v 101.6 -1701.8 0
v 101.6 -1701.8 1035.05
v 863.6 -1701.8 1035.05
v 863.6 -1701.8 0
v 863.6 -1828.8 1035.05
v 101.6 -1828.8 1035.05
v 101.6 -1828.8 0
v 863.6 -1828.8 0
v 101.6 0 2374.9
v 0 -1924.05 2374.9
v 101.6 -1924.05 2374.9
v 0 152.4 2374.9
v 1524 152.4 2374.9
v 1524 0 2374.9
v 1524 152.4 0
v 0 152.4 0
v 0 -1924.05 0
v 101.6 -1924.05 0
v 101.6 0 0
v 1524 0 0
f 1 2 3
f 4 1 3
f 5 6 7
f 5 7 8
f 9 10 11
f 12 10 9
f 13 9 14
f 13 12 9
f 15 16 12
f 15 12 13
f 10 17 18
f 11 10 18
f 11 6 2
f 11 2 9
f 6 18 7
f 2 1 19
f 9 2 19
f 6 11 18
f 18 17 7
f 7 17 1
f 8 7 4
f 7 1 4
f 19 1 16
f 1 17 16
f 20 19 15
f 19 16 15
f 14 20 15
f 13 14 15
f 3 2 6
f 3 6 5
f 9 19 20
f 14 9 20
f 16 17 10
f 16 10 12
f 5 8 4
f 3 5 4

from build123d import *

# Parameters (mm, degrees)
F0_W     = 101.6
F0_H     = 1924.05
F3_DEPTH = 2374.9
F1_W     = 1524
F1_H     = 152.4
F4_DEPTH = 2374.9
F2_W     = 762
F2_H     = 127
F5_DEPTH = 1035.05


with BuildPart() as f3:
    # F0 (on Top) → F3 (new body)
    with BuildSketch(Plane.XY):
        with Locations((50.8, -962.025)):
            Rectangle(F0_W, F0_H)
    extrude(amount=F3_DEPTH)

    # F1 (on Top) → F4 (join)
    with BuildSketch(Plane.XY):
        with Locations((762, 76.2)):
            Rectangle(F1_W, F1_H)
    extrude(amount=F4_DEPTH)

    # F2 (on Top) → F5 (join)
    with BuildSketch(Plane.XY):
        with Locations((482.6, -1765.3)):
            Rectangle(F2_W, F2_H)
    extrude(amount=F5_DEPTH)


solid = f3.part
